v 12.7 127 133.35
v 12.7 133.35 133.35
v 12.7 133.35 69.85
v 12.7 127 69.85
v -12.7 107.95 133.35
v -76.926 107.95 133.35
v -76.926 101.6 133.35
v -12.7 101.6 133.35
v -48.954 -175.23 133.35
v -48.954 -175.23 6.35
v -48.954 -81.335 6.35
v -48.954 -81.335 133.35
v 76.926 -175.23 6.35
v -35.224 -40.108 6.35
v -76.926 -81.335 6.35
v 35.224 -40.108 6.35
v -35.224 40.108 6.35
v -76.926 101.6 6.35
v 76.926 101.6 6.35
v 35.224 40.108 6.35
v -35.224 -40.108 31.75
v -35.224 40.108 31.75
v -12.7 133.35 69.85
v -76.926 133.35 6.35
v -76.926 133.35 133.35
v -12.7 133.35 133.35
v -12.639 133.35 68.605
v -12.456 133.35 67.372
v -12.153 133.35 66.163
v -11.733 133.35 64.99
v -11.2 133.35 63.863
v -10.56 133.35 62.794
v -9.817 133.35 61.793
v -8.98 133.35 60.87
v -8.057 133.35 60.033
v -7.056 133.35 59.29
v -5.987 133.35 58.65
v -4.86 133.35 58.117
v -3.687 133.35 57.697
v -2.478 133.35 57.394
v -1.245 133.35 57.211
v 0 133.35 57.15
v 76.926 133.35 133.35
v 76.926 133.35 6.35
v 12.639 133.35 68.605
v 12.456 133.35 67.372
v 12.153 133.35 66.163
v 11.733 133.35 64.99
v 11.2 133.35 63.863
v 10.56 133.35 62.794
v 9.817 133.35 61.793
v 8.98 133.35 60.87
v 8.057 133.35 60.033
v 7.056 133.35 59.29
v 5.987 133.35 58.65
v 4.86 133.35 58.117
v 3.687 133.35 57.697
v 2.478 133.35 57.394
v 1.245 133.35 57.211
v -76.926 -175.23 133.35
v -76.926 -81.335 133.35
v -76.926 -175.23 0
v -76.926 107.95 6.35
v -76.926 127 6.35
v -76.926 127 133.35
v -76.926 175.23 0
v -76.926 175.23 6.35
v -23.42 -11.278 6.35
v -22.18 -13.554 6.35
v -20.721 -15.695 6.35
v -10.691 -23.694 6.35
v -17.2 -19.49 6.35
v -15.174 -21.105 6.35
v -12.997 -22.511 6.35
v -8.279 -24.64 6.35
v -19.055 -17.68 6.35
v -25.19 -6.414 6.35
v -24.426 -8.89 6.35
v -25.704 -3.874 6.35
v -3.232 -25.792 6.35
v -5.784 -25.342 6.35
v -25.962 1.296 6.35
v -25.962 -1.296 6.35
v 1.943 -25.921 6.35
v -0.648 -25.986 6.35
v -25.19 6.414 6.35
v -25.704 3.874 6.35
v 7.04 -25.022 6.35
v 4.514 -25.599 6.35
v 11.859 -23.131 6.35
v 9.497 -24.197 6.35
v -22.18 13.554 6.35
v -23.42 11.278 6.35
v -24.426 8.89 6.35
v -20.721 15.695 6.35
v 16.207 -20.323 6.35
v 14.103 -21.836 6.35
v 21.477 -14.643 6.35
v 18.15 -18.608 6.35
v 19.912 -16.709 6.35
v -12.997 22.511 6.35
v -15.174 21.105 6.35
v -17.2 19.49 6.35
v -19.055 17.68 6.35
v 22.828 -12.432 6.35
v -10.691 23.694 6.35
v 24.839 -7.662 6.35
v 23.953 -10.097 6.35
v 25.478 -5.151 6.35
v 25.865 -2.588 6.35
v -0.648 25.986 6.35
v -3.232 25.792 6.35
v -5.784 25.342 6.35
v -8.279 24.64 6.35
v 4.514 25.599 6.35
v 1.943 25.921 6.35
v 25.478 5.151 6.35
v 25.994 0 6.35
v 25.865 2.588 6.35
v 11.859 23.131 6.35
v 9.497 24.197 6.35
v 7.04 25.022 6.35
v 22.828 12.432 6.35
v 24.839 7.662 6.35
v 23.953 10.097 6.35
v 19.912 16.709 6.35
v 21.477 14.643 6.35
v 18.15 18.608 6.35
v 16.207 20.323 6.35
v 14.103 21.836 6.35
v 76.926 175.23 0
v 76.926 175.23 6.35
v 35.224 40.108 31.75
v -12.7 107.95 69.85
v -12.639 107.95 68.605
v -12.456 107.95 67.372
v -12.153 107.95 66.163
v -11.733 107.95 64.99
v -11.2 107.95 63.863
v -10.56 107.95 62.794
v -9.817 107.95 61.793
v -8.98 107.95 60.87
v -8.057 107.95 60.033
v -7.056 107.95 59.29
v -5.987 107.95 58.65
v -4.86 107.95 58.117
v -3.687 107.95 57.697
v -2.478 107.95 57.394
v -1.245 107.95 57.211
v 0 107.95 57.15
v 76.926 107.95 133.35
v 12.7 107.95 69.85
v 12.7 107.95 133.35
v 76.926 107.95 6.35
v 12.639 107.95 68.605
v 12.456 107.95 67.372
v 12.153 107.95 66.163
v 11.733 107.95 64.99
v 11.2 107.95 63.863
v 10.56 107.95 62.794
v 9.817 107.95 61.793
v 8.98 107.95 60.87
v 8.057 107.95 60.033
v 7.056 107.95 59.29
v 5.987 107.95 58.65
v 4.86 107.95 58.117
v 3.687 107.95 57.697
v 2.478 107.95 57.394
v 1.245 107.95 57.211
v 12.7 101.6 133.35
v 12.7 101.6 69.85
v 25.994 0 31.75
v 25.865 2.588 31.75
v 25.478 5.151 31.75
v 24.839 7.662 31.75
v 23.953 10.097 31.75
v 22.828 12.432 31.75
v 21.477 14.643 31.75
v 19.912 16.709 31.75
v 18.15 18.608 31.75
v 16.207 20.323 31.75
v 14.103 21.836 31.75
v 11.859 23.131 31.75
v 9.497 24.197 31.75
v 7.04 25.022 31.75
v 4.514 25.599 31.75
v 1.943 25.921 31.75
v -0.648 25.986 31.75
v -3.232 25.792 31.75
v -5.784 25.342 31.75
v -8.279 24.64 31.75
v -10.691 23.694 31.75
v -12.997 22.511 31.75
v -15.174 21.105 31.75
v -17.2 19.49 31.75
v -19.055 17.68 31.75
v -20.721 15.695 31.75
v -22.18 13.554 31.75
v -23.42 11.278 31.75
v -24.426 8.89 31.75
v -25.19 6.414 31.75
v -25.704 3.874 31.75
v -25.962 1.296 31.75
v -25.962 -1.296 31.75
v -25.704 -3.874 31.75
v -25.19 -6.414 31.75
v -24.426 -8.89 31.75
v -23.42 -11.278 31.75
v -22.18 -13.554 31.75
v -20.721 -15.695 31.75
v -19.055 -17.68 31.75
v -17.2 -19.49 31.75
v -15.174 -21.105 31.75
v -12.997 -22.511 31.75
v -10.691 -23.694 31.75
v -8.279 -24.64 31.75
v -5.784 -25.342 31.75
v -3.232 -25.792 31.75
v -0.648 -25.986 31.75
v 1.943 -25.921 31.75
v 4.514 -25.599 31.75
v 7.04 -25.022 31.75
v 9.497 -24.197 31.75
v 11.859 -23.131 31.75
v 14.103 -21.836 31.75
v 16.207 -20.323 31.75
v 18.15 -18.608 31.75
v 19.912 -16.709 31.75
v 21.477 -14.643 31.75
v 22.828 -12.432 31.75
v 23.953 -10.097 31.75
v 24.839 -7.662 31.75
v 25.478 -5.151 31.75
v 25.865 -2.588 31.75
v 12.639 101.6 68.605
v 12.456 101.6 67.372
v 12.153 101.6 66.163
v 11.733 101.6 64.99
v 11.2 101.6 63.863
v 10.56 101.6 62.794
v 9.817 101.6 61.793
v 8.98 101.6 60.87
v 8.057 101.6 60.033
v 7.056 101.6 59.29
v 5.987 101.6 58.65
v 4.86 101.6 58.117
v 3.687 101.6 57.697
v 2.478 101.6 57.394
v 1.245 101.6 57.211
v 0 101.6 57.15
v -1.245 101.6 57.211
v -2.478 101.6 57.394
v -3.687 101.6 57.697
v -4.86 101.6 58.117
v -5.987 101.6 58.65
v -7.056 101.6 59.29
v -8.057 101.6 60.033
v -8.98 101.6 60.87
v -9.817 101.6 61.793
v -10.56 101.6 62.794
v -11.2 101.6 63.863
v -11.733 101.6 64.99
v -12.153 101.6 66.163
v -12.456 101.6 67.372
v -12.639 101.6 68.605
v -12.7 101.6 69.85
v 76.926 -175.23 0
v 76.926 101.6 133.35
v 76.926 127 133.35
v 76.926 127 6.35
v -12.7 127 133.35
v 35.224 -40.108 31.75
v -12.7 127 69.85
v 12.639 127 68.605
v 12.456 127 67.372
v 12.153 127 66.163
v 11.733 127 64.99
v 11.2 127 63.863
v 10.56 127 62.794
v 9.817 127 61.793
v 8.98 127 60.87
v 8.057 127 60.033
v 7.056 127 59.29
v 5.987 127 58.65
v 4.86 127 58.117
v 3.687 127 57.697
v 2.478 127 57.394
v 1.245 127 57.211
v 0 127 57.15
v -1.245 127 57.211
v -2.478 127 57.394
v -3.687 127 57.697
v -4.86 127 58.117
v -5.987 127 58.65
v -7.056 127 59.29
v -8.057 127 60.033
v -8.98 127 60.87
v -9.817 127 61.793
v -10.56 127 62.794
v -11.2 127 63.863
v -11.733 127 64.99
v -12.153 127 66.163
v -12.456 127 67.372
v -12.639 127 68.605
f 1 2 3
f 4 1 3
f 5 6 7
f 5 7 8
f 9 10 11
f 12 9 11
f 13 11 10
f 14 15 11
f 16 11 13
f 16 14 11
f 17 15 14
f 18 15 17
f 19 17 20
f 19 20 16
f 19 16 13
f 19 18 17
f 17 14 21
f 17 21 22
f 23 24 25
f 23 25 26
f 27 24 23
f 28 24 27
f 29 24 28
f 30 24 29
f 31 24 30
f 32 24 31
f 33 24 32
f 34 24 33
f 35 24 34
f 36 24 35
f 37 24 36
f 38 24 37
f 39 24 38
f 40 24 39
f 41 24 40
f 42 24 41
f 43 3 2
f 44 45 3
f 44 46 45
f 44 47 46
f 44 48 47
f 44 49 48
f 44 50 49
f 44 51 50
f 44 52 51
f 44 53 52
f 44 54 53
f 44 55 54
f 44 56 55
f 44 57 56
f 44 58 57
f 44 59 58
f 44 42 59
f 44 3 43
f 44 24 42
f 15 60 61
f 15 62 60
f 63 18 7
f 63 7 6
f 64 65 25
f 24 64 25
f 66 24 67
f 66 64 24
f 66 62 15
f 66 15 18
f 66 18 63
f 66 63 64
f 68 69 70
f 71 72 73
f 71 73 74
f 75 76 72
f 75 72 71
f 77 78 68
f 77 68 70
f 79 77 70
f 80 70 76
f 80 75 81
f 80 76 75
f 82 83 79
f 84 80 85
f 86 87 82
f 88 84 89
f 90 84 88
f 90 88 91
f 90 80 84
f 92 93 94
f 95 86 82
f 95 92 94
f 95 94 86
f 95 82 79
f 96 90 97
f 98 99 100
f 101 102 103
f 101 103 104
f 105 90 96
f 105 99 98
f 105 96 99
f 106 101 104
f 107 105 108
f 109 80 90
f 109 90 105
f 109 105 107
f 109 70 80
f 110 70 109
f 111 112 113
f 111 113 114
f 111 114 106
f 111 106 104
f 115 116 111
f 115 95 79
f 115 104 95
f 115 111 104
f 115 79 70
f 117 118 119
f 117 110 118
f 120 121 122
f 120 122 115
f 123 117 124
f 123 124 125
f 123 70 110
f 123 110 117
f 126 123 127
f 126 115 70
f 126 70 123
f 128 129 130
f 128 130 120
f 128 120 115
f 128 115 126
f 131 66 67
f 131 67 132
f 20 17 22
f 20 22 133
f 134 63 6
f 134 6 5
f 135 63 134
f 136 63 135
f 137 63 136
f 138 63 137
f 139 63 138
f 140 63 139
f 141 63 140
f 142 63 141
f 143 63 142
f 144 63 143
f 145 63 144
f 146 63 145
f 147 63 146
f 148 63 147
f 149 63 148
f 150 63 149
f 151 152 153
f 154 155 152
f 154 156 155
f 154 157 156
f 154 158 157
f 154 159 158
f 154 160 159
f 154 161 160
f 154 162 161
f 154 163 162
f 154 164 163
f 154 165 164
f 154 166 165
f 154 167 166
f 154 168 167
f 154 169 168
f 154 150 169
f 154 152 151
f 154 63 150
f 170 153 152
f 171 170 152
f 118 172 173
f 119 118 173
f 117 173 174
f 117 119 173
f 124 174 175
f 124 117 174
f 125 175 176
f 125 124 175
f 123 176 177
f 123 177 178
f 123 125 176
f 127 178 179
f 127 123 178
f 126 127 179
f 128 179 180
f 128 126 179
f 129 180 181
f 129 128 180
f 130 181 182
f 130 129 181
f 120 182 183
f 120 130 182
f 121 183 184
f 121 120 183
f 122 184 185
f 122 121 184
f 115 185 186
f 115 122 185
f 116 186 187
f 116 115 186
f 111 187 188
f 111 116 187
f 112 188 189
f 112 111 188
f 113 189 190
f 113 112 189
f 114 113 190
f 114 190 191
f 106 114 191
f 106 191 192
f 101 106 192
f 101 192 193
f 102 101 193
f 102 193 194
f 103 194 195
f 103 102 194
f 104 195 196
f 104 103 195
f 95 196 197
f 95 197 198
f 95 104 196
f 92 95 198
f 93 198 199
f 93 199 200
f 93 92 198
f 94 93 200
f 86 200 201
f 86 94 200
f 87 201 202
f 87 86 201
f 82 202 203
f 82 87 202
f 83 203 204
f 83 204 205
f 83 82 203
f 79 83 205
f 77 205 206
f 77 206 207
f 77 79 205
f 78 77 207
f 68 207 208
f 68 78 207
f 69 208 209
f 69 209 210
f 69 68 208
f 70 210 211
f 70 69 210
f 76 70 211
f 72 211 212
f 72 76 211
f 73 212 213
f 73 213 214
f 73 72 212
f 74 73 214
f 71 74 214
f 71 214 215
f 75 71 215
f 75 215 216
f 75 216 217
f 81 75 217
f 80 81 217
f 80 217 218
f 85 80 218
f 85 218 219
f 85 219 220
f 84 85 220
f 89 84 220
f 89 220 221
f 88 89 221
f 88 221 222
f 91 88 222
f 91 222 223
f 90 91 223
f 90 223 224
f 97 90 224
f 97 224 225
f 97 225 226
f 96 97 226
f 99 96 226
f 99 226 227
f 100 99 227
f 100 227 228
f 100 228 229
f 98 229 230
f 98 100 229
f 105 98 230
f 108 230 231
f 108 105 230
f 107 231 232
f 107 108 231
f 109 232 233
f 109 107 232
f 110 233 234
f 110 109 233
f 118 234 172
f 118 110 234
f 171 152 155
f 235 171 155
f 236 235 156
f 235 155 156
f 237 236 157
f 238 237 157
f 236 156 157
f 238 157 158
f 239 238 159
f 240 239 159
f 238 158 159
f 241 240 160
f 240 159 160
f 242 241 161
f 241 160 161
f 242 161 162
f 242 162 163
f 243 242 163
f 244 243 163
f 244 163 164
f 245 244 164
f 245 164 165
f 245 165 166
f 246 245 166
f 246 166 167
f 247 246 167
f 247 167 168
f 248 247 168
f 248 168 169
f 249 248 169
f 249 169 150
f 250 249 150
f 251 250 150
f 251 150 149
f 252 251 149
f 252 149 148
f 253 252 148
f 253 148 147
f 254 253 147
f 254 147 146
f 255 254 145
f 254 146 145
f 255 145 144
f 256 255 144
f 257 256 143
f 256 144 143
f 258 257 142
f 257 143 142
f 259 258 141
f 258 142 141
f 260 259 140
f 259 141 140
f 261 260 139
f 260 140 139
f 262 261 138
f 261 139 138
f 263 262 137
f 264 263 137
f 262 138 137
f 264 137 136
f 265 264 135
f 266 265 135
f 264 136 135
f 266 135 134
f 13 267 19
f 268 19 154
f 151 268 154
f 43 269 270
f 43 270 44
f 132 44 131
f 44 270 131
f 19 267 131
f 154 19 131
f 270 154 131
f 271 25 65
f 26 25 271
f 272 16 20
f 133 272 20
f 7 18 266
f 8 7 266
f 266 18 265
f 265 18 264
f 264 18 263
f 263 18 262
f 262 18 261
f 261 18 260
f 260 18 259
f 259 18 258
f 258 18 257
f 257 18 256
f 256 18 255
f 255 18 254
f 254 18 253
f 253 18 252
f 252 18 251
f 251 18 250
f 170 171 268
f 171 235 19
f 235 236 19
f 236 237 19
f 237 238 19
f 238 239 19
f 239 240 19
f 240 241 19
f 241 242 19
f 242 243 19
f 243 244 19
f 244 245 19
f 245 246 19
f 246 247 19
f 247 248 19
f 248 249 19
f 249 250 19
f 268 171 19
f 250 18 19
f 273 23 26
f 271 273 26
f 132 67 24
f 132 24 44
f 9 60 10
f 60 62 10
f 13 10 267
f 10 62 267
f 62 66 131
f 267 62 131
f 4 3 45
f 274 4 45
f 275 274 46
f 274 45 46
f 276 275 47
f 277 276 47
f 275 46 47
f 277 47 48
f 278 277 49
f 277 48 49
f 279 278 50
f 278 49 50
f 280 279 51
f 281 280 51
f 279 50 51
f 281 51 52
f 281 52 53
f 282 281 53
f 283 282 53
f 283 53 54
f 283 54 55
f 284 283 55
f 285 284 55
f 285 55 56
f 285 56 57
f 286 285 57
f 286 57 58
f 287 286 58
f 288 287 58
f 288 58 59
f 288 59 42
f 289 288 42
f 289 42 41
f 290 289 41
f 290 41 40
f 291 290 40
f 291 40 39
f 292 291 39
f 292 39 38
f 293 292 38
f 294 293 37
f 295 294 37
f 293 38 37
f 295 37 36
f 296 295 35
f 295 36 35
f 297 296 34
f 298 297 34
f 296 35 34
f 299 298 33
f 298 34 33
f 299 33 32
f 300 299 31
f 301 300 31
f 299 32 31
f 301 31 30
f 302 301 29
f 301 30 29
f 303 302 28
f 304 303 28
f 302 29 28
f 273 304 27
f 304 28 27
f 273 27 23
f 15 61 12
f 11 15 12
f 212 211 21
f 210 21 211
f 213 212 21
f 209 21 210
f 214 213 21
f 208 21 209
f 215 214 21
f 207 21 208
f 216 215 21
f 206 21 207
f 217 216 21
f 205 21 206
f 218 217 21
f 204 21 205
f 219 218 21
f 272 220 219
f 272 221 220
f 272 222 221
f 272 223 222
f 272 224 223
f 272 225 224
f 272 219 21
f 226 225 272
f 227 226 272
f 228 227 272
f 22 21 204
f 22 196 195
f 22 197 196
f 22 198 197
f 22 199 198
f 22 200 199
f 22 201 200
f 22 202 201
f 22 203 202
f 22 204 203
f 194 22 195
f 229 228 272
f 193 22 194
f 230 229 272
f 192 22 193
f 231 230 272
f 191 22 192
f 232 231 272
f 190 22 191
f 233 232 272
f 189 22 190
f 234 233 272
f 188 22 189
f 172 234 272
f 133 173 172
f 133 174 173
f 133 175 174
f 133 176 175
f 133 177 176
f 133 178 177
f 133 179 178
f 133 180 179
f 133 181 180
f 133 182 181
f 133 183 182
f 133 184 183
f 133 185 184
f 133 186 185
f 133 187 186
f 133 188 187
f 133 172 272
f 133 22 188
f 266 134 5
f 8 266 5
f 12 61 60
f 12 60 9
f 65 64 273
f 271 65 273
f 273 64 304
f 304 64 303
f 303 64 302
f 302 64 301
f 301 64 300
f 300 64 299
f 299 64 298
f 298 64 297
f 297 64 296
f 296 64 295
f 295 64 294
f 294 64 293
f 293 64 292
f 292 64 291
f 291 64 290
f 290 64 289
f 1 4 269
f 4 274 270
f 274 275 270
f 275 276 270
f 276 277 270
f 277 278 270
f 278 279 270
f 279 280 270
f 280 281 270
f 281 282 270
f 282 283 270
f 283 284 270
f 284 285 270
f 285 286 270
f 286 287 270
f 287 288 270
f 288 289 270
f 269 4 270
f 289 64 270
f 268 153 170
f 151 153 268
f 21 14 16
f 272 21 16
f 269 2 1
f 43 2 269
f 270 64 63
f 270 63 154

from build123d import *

# Parameters (mm, degrees)
F0_W      = 153.852672
F0_H      = 350.459368
F1_DEPTH  = 6.35
F2_W      = 153.852672
F2_H      = 6.35
F3_DEPTH  = 127
F4_W      = 153.852672
F4_H      = 6.35
F5_DEPTH  = 127
F7_DEPTH  = 96.774
F8_W      = 70.44766
F8_H      = 80.216594
F8_R      = 25.993866
F9_DEPTH  = 25.4
F10_W     = 27.971894
F10_H     = 93.894914
F11_DEPTH = 127


with BuildPart() as f1:
    # F0 (on Top) → F1 (new body)
    with BuildSketch(Plane.XY):
        Rectangle(F0_W, F0_H)
    extrude(amount=F1_DEPTH)

    # F2 (on face) → F3 (join)
    with BuildSketch(Plane.XY.offset(6.35)):
        with Locations((0, 130.175)):
            Rectangle(F2_W, F2_H)
    extrude(amount=F3_DEPTH)

    # F4 (on face) → F5 (join)
    with BuildSketch(Plane.XY.offset(6.35)):
        with Locations((0, 104.775)):
            Rectangle(F4_W, F4_H)
    extrude(amount=F5_DEPTH)

    # F6 (on face) → F7 (cut)
    with BuildSketch(Plane(origin=(0, 133.35, 0), x_dir=(-1, 0, 0), z_dir=(0, 1, 0))):
        with BuildLine():
            Line((12.7, 133.35), (0, 133.35))
            Line((0, 133.35), (-12.7, 133.35))
            Line((-12.7, 133.35), (-12.7, 69.85))
            ThreePointArc((-12.7, 69.85), (0, 57.15), (12.7, 69.85))
            Line((12.7, 69.85), (12.7, 133.35))
        make_face()
    extrude(amount=-F7_DEPTH, mode=Mode.SUBTRACT)

    # F8 (on face) → F9 (join)
    with BuildSketch(Plane.XY.offset(6.35)):
        Rectangle(F8_W, F8_H)
        Circle(F8_R, mode=Mode.SUBTRACT)
    extrude(amount=F9_DEPTH)

    # F10 (on face) → F11 (join)
    with BuildSketch(Plane.XY.offset(6.35)):
        with Locations((-62.940389, -128.282227)):
            Rectangle(F10_W, F10_H)
    extrude(amount=F11_DEPTH)


solid = f1.part
